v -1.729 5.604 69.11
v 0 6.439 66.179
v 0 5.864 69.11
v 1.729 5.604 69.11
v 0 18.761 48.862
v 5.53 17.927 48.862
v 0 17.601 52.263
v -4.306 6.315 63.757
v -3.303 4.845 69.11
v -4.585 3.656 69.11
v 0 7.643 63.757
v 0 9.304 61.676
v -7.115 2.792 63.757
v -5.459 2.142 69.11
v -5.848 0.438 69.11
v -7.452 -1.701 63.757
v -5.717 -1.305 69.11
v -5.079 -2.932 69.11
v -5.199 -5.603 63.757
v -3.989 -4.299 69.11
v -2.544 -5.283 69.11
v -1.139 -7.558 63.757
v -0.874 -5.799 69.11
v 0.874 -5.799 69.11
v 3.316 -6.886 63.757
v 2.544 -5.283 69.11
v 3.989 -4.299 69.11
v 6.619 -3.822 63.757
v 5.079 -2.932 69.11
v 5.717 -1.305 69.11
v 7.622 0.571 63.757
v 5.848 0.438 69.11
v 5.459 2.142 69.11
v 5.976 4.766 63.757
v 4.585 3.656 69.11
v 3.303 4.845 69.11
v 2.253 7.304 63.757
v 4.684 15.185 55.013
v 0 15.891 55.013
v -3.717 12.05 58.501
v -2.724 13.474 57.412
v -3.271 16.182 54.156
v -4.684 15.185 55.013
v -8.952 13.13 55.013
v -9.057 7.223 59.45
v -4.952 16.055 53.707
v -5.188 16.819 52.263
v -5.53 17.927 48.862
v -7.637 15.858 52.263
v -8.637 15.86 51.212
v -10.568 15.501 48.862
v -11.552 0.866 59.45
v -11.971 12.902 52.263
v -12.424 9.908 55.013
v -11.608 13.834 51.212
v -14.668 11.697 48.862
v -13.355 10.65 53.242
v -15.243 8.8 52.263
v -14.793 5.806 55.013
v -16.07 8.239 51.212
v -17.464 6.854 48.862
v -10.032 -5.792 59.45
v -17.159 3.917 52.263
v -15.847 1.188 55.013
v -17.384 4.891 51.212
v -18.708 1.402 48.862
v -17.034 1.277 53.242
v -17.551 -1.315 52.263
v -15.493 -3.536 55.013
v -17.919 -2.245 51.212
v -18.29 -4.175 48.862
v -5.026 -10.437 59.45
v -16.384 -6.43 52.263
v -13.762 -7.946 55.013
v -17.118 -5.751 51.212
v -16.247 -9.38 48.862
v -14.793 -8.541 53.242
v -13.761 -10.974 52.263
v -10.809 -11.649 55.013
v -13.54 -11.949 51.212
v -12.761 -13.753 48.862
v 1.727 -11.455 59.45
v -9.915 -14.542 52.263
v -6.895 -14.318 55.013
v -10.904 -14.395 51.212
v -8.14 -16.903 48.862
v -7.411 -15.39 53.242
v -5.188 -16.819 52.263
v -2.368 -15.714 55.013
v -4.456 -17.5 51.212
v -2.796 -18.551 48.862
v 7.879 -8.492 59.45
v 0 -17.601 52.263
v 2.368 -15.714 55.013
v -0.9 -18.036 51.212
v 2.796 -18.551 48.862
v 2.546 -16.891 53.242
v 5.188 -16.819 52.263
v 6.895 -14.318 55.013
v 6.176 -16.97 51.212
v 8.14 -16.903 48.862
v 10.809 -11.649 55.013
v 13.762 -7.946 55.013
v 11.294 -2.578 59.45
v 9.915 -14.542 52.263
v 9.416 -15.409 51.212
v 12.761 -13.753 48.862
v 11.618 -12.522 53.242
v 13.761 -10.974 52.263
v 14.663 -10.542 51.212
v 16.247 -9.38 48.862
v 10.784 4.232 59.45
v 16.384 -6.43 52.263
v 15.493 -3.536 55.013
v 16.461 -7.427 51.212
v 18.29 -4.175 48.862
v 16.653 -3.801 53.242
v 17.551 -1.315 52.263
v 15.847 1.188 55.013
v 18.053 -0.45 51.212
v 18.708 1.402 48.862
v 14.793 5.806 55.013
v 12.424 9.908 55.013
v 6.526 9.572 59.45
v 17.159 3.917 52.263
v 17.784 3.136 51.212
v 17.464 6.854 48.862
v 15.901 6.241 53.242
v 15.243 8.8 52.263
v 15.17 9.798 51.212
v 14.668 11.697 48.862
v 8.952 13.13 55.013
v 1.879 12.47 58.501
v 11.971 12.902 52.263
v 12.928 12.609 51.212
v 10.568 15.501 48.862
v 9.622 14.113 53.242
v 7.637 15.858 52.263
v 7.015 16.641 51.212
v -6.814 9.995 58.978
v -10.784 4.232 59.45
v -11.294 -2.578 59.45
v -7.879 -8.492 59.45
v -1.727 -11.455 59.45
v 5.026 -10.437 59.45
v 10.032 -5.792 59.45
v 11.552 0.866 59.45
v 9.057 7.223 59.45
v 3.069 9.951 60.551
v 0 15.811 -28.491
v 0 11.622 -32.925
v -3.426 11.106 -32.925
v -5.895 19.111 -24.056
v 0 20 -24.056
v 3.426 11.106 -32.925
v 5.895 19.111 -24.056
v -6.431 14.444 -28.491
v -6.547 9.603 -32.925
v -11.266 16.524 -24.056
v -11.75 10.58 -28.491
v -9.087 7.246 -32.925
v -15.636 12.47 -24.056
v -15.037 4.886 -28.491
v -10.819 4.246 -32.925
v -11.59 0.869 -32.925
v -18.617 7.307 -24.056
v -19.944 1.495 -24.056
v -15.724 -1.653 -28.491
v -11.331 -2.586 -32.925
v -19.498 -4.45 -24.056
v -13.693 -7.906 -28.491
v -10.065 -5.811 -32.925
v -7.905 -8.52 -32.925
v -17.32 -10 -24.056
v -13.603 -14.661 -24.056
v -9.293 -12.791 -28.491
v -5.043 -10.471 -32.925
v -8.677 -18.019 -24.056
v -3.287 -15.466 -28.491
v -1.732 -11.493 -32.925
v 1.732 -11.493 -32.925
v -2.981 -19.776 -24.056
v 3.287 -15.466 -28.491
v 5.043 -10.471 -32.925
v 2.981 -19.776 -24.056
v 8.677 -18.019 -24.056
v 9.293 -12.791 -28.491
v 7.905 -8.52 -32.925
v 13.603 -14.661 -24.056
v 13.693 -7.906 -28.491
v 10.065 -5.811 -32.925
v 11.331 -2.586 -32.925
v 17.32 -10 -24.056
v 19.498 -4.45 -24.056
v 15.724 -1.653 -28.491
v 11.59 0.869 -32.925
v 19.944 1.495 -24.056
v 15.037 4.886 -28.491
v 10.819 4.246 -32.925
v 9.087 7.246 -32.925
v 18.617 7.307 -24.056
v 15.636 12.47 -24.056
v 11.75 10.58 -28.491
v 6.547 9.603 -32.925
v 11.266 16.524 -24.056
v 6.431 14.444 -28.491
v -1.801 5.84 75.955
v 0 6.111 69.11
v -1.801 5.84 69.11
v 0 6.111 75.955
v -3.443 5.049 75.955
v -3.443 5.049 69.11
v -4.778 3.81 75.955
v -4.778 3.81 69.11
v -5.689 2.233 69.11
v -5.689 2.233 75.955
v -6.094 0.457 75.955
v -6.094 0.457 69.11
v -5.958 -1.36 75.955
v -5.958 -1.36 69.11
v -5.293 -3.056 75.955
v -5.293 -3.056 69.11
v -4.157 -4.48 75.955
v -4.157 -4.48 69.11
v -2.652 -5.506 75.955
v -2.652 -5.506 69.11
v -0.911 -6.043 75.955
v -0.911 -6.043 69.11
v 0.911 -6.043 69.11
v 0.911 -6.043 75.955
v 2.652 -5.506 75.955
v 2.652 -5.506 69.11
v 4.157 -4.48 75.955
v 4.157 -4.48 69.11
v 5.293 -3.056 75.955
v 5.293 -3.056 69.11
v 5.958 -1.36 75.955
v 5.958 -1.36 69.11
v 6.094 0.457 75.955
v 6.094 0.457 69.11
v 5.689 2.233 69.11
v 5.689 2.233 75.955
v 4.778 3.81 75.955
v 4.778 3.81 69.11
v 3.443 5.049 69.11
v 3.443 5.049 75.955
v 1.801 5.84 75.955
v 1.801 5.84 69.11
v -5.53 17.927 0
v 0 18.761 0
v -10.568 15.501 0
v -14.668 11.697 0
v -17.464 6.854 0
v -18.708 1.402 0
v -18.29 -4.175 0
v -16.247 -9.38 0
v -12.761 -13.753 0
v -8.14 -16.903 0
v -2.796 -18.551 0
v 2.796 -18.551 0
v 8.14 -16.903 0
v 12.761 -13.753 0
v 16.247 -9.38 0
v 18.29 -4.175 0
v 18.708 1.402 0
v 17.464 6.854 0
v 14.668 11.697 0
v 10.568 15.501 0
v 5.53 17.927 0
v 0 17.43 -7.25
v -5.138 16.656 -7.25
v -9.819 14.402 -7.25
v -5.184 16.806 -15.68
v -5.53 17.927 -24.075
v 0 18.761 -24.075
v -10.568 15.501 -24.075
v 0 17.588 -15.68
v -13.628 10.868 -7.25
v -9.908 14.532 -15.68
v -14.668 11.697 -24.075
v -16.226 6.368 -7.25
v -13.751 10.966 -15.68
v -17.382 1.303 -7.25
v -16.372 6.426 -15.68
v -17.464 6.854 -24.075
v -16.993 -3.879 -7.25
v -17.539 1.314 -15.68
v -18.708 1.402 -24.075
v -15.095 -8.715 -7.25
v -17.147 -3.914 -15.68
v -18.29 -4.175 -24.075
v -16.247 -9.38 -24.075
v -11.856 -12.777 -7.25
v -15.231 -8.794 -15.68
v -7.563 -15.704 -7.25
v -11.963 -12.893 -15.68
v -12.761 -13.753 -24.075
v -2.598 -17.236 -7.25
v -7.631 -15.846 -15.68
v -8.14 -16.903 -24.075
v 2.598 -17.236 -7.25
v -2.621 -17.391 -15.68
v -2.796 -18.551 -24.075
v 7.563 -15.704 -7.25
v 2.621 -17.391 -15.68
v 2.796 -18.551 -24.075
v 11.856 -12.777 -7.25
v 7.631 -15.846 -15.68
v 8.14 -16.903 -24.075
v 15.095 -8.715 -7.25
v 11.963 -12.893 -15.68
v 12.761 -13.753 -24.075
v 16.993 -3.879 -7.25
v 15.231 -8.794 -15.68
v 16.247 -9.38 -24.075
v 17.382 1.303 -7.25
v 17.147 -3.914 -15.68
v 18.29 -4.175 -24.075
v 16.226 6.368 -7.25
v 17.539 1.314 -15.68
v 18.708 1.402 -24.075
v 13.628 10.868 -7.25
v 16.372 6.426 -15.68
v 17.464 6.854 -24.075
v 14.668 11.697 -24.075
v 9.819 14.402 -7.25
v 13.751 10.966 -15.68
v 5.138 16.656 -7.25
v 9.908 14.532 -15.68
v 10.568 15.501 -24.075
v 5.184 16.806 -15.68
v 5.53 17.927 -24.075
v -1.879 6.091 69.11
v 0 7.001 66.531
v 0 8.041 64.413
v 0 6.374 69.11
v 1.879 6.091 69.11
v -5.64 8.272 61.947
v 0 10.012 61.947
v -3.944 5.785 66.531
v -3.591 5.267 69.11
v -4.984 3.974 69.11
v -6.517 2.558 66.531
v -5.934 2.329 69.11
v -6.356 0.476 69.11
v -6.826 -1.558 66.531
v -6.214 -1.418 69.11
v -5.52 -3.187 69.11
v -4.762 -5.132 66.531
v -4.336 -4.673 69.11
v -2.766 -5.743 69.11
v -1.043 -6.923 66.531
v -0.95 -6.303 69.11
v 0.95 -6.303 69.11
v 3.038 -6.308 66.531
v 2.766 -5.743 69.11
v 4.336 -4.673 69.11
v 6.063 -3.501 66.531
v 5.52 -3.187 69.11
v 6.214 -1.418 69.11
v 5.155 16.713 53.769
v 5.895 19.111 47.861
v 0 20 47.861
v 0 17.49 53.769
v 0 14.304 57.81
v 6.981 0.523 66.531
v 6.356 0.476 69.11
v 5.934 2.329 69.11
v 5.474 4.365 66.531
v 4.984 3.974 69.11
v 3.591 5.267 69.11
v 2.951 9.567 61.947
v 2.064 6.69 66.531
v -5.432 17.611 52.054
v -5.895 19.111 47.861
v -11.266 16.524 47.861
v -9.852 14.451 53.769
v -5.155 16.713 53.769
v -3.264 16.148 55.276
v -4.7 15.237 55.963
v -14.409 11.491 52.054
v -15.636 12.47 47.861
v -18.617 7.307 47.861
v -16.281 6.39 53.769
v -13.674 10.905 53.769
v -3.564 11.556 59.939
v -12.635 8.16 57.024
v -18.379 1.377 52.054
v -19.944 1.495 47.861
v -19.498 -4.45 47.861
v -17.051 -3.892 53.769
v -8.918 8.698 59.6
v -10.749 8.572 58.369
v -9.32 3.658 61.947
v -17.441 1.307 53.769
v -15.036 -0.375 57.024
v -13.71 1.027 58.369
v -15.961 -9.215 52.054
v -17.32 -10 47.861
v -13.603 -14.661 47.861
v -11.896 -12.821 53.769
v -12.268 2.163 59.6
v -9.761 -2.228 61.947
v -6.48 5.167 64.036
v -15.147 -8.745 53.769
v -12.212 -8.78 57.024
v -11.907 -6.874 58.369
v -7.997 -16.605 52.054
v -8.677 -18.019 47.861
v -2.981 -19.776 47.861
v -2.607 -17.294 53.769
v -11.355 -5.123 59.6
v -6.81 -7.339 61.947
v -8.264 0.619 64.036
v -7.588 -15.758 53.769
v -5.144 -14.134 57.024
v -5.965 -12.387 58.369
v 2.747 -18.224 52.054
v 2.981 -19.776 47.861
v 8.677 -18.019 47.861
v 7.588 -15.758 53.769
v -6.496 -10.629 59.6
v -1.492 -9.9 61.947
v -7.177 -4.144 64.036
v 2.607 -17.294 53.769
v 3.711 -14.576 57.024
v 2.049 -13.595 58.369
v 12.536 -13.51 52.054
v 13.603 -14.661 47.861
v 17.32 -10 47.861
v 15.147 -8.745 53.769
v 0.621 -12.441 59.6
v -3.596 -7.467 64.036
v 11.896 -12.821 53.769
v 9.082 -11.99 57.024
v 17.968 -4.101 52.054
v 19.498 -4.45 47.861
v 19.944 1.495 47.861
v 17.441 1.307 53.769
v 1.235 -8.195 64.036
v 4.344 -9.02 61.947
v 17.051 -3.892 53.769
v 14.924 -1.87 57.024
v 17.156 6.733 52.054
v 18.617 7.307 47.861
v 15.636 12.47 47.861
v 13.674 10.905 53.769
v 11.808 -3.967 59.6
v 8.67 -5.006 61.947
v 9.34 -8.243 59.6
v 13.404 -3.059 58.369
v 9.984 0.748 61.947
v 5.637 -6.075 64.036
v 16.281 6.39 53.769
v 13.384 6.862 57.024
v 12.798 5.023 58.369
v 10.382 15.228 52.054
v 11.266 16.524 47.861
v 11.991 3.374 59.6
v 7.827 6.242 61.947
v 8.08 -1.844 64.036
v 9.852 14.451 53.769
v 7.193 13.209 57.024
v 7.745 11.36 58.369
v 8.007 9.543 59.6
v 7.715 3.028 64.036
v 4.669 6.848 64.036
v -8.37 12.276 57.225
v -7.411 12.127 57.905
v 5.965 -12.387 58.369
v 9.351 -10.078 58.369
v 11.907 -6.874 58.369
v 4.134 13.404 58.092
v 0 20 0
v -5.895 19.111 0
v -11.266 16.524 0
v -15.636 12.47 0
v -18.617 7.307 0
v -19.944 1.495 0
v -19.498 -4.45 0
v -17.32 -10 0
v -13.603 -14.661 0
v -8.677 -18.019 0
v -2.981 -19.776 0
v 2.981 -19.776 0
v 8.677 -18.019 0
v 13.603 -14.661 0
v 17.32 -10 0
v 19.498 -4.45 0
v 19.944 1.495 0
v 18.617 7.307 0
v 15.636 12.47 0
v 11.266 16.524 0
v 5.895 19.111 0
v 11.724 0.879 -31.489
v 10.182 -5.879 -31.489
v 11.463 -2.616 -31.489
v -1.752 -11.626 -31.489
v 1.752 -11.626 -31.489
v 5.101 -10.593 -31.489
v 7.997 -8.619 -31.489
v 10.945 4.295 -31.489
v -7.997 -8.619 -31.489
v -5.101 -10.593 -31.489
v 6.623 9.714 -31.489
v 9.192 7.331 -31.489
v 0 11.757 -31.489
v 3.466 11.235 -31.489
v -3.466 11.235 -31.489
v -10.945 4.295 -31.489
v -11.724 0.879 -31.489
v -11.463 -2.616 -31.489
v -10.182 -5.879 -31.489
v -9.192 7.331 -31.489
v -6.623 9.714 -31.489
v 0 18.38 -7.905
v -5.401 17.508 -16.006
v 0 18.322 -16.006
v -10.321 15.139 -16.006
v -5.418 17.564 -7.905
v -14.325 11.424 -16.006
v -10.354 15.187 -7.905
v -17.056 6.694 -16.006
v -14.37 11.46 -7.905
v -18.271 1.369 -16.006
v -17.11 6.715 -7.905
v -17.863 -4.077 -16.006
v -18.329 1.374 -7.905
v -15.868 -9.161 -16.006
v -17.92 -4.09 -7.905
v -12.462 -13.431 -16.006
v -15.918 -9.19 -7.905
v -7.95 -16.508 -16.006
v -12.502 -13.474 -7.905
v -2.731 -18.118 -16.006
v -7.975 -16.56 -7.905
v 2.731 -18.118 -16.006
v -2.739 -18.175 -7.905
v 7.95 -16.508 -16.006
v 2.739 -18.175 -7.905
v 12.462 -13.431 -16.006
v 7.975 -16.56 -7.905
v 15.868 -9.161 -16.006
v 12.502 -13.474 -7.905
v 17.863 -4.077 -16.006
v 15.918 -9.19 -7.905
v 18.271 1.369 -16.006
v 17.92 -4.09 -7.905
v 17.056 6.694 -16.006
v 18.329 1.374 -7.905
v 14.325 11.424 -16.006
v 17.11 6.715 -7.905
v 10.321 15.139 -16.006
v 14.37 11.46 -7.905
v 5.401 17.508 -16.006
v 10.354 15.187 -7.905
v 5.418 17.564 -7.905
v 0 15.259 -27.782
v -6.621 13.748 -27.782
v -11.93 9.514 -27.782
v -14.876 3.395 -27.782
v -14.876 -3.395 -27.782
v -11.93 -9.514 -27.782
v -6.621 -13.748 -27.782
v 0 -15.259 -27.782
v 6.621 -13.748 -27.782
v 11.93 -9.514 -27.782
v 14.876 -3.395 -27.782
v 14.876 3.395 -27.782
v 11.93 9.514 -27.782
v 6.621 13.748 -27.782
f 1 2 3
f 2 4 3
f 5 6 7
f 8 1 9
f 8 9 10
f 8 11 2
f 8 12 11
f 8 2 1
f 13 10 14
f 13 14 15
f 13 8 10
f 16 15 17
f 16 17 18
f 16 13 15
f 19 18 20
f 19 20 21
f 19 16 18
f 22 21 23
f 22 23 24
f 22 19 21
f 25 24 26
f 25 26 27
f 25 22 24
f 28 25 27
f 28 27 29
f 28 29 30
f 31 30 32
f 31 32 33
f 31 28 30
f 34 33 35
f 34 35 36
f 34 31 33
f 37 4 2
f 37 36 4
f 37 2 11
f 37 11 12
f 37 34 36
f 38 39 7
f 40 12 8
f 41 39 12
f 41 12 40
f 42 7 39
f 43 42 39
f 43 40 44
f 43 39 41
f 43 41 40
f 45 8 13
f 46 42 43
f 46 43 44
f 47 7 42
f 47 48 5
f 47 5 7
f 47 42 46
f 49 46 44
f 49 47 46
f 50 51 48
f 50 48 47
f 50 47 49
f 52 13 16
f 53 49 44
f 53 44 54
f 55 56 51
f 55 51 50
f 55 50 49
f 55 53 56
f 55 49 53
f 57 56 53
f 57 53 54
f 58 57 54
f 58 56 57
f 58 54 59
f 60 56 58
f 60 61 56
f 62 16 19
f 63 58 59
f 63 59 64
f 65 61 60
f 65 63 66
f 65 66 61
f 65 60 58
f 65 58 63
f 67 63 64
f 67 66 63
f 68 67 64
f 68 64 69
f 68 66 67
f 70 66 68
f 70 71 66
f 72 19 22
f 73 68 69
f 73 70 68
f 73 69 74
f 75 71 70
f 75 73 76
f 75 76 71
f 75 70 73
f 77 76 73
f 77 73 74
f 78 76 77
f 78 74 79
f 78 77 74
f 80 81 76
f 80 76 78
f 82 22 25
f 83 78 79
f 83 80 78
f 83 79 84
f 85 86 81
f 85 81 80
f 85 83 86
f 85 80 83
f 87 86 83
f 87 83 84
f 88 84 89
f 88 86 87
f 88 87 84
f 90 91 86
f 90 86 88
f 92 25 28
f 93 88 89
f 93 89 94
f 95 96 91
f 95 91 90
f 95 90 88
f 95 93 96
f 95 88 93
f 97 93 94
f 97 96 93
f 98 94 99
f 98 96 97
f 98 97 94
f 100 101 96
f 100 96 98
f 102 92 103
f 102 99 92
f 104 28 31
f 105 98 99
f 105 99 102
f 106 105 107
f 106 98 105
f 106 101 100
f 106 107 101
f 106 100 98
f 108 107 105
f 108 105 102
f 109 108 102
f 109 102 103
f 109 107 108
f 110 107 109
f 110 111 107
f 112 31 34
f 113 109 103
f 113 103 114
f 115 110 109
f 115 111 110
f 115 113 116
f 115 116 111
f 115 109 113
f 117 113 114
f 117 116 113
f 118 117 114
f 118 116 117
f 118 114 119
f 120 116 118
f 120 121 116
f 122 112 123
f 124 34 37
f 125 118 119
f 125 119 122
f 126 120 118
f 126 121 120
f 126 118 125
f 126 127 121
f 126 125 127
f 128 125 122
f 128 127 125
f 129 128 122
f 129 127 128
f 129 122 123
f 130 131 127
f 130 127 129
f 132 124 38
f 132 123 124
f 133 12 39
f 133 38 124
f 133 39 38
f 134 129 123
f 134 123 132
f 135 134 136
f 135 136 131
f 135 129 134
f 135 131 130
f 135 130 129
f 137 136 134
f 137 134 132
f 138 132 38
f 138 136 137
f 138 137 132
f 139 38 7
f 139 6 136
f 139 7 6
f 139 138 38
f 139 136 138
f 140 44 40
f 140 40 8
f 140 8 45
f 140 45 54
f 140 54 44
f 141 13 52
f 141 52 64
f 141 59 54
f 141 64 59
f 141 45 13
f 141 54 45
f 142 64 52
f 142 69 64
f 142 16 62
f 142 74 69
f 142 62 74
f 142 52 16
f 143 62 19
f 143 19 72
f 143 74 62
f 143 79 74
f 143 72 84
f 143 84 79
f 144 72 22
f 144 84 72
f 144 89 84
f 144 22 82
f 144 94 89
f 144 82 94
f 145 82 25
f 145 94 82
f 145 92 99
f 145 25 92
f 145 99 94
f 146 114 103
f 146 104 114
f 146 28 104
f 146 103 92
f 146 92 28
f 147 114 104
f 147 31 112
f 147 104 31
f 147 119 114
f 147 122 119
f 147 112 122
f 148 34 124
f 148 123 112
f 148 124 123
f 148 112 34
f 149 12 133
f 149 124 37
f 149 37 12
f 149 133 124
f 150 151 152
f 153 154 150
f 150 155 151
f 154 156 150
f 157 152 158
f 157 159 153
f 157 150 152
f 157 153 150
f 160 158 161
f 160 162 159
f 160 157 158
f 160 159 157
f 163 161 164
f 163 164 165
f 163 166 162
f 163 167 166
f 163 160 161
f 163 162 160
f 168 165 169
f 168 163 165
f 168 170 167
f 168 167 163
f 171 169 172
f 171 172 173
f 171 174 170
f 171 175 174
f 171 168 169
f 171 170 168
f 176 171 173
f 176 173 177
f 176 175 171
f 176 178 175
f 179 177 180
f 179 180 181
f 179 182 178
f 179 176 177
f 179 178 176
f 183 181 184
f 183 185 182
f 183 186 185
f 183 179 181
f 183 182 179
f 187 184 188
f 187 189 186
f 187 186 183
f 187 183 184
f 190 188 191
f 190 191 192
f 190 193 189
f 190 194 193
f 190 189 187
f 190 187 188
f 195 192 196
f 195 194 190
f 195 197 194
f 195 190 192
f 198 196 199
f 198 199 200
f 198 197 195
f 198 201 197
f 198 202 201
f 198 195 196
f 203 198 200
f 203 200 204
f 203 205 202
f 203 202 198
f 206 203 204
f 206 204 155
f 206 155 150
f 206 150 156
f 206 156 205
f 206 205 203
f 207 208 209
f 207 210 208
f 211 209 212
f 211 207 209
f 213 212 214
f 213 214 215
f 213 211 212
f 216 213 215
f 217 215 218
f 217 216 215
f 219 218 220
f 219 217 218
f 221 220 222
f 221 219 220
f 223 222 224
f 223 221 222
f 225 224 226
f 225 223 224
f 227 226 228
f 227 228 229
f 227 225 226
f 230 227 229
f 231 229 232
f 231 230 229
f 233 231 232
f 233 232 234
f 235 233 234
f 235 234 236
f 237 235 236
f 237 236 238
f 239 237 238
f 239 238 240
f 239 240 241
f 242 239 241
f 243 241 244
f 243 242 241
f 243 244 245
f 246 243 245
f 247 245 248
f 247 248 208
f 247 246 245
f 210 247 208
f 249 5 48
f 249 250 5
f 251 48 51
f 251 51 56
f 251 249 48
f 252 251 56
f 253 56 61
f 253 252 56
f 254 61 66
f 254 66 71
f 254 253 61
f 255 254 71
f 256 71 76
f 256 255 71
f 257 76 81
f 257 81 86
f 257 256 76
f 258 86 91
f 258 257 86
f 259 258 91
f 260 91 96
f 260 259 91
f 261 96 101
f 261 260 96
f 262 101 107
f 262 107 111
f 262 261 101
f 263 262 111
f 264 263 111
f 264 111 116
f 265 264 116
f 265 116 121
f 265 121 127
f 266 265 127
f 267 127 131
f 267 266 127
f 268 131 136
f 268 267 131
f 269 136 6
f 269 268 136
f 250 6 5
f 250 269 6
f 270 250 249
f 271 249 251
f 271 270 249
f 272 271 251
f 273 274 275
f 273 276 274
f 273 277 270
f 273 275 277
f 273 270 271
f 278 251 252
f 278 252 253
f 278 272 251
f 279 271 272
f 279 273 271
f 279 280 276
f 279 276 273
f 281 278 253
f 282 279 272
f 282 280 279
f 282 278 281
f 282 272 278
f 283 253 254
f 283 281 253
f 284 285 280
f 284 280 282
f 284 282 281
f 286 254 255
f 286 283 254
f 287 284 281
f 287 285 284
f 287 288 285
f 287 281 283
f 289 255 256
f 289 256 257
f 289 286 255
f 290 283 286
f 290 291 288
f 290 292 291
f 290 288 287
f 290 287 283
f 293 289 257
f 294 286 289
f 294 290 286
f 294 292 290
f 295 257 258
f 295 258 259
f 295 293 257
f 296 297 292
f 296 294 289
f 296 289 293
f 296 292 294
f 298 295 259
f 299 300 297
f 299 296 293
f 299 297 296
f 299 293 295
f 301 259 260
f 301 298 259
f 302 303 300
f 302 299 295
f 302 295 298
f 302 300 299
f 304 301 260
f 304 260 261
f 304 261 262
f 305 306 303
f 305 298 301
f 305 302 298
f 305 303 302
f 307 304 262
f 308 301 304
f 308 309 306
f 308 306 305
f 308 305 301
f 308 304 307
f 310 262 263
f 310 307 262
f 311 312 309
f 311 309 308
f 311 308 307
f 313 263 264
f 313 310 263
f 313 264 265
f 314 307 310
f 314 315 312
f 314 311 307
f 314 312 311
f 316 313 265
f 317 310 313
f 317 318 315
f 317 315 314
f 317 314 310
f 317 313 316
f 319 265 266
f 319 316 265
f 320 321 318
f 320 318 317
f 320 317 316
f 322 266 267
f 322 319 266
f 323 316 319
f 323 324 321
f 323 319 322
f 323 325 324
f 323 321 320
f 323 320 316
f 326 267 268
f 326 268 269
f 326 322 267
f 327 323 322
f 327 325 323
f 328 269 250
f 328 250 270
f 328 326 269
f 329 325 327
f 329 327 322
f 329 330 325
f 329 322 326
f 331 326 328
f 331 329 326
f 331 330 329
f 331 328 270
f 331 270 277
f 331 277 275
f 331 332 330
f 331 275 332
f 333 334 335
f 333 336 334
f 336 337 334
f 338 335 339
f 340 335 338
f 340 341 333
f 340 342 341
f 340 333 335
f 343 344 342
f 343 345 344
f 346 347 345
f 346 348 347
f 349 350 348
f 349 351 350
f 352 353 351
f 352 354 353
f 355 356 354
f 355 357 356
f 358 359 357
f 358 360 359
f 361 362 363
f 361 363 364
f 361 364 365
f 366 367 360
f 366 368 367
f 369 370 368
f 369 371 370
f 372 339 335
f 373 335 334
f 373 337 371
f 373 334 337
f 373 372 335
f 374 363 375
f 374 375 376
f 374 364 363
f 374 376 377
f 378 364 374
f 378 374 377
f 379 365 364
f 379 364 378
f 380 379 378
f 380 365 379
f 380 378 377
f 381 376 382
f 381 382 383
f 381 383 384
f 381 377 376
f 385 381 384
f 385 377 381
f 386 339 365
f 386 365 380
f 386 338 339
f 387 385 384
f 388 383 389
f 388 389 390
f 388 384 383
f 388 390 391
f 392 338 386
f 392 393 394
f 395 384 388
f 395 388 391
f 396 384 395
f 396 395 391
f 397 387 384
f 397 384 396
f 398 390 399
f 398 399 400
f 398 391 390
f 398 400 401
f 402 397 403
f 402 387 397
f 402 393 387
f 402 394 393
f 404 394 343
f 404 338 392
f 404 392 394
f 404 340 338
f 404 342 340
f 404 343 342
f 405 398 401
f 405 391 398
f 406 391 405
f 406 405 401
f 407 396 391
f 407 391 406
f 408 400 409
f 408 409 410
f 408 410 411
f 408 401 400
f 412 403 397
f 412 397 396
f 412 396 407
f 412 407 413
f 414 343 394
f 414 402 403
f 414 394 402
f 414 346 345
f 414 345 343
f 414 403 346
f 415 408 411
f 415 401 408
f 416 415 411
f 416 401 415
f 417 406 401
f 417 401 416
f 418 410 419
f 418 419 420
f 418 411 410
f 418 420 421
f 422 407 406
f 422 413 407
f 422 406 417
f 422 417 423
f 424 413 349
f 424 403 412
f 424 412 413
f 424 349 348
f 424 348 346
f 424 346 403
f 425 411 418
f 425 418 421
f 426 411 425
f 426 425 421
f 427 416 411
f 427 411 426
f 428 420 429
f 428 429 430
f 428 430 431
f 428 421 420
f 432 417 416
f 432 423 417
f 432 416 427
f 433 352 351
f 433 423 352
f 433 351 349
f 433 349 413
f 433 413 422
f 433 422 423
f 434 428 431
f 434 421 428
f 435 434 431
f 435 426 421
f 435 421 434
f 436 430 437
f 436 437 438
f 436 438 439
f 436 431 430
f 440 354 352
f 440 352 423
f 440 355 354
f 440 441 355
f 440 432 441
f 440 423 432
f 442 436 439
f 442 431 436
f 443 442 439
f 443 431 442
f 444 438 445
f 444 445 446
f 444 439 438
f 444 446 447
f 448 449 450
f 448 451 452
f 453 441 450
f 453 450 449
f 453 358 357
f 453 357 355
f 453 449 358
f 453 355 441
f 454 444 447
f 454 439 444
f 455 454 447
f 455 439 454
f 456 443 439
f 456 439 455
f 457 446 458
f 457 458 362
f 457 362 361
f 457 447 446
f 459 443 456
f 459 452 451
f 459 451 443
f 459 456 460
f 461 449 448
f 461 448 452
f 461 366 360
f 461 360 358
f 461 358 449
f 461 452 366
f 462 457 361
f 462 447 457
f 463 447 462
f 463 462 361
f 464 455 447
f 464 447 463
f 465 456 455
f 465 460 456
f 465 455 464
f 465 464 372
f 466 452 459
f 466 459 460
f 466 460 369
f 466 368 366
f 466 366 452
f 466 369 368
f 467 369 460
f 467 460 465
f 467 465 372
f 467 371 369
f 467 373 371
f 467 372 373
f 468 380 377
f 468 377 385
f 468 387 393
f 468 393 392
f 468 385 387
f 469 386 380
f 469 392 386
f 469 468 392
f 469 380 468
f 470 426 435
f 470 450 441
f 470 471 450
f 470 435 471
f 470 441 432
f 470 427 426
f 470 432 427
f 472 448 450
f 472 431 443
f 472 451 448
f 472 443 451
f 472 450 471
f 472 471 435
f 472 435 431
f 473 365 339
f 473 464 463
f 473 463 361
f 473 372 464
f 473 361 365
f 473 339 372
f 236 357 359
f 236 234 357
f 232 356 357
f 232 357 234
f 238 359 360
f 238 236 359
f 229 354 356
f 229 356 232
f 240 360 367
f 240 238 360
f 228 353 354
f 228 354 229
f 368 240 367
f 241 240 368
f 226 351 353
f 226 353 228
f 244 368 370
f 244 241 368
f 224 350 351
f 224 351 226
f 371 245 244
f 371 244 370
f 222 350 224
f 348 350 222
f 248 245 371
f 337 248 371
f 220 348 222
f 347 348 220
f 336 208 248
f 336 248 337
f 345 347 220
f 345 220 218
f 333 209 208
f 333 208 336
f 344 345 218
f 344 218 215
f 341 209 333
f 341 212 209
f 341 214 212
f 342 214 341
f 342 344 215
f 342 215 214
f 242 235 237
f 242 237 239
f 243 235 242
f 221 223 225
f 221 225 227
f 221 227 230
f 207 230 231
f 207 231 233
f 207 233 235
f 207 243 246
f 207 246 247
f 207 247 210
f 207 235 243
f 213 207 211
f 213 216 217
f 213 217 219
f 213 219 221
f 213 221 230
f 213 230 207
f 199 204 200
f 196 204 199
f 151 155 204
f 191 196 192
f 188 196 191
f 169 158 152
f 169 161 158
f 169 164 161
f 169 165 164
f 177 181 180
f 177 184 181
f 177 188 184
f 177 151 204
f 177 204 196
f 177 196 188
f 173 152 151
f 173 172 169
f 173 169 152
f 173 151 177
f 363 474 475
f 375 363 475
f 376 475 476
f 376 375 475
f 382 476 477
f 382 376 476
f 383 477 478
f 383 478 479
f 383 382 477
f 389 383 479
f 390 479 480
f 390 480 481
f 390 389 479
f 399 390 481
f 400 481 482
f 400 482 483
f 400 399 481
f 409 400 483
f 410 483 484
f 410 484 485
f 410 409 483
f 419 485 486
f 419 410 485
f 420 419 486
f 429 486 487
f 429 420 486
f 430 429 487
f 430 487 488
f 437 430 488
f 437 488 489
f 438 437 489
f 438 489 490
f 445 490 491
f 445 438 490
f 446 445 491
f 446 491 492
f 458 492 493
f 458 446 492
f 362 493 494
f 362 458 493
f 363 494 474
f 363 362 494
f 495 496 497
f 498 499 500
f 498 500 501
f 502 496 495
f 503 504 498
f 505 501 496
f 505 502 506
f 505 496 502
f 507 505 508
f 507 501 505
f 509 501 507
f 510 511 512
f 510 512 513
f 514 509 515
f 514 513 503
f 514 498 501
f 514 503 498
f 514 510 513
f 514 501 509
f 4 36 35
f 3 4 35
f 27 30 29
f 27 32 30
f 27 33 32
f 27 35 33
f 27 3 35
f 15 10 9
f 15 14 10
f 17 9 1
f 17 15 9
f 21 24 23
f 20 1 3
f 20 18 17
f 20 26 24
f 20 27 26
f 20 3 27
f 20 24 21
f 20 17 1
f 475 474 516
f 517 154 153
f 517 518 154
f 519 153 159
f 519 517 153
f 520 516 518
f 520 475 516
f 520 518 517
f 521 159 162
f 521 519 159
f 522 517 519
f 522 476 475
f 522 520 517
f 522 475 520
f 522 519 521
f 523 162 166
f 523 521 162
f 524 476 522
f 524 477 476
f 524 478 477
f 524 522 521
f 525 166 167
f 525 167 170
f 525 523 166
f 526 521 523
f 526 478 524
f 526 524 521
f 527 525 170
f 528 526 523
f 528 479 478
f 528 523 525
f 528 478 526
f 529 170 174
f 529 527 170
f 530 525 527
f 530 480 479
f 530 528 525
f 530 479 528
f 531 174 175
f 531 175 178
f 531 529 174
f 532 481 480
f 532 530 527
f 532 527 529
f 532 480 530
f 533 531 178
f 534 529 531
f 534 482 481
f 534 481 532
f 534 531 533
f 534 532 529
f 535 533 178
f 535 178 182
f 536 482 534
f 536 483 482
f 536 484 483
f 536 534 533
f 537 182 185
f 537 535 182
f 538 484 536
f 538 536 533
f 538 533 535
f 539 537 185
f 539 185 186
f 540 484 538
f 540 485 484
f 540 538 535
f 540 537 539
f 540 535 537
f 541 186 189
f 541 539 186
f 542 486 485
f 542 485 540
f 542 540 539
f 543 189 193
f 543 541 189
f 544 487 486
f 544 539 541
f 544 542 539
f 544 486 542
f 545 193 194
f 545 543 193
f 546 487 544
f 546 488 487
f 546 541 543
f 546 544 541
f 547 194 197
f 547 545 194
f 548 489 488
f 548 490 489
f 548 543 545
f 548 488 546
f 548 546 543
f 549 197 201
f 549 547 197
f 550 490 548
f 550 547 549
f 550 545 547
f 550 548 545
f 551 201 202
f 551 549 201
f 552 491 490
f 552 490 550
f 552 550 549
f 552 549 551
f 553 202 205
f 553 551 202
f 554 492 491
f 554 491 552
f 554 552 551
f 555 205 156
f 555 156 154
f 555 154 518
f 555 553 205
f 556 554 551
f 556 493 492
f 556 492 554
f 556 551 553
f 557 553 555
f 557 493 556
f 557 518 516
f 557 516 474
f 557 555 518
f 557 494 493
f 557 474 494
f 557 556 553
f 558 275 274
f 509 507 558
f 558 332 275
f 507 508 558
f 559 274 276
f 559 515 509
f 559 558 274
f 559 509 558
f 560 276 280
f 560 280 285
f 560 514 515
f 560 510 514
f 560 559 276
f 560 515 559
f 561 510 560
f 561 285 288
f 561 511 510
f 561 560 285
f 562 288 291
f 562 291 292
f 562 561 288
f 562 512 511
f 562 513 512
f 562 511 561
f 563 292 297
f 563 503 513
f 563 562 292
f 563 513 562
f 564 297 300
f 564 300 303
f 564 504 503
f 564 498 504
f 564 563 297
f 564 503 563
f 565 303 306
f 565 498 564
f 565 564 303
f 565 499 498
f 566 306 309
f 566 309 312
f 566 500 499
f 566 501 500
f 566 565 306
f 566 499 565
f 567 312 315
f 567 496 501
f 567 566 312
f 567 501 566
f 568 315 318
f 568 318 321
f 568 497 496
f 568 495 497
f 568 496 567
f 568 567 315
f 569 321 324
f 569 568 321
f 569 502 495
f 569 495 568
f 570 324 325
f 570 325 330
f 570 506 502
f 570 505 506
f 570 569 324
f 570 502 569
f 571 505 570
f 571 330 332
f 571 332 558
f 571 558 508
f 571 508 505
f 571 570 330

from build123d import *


with BuildPart() as f1:
    # F0 (on Right) → F1 (revolve)
    with BuildSketch(Plane.YZ):
        with BuildLine():
            Line((0, -31.489287), (0, -32.924928))
            Line((0, -32.924928), (11.622462, -32.924928))
            Line((11.622462, -32.924928), (19.999593, -24.056212))
            add(Edge.make_bspline(
                [(19.999593, -24.056212), (17.396746, -16.114077), (17.657735, -7.724358), (19.999593, 0)],
                knots=[0, 0, 0, 0, 24.056212, 24.056212, 24.056212, 24.056212], degree=3))
            Line((19.999593, 0), (19.999593, 47.861013))
            add(Edge.make_bspline(
                [(19.999593, 47.861013), (16.597867, 60.171429), (7.622306, 59.965661), (6.374207, 69.110181)],
                knots=[0, 0, 0, 0, 25.24239, 25.24239, 25.24239, 25.24239], degree=3))
            Line((6.374207, 69.110181), (6.358525, 69.110181))
            Line((6.358525, 69.110181), (6.111381, 69.110181))
            Line((6.111381, 69.110181), (5.864237, 69.110181))
            add(Edge.make_bspline(
                [(5.864237, 69.110181), (6.431991, 59.965661), (16.597867, 58.923964), (18.760797, 48.862453)],
                knots=[0, 0, 0, 0, 24.006077, 24.006077, 24.006077, 24.006077], degree=3))
            Line((18.760797, 48.862453), (18.760797, 0))
            add(Edge.make_bspline(
                [(18.760797, 0), (16.353968, -7.724358), (17.396746, -16.114077), (18.760797, -24.074806)],
                knots=[0, 0, 0, 0, 24.074806, 24.074806, 24.074806, 24.074806], degree=3))
            Line((18.760797, -24.074806), (11.757294, -31.489287))
            Line((11.757294, -31.489287), (0, -31.489287))
        make_face()
        Polygon((0, 75.95484), (0, 69.110181), (5.864237, 69.110181), (6.111381, 69.110181), (6.111381, 75.95484), align=None)
    revolve(axis=Axis((0, 0, 10.99069), (0, 0, 1)))


solid = f1.part
